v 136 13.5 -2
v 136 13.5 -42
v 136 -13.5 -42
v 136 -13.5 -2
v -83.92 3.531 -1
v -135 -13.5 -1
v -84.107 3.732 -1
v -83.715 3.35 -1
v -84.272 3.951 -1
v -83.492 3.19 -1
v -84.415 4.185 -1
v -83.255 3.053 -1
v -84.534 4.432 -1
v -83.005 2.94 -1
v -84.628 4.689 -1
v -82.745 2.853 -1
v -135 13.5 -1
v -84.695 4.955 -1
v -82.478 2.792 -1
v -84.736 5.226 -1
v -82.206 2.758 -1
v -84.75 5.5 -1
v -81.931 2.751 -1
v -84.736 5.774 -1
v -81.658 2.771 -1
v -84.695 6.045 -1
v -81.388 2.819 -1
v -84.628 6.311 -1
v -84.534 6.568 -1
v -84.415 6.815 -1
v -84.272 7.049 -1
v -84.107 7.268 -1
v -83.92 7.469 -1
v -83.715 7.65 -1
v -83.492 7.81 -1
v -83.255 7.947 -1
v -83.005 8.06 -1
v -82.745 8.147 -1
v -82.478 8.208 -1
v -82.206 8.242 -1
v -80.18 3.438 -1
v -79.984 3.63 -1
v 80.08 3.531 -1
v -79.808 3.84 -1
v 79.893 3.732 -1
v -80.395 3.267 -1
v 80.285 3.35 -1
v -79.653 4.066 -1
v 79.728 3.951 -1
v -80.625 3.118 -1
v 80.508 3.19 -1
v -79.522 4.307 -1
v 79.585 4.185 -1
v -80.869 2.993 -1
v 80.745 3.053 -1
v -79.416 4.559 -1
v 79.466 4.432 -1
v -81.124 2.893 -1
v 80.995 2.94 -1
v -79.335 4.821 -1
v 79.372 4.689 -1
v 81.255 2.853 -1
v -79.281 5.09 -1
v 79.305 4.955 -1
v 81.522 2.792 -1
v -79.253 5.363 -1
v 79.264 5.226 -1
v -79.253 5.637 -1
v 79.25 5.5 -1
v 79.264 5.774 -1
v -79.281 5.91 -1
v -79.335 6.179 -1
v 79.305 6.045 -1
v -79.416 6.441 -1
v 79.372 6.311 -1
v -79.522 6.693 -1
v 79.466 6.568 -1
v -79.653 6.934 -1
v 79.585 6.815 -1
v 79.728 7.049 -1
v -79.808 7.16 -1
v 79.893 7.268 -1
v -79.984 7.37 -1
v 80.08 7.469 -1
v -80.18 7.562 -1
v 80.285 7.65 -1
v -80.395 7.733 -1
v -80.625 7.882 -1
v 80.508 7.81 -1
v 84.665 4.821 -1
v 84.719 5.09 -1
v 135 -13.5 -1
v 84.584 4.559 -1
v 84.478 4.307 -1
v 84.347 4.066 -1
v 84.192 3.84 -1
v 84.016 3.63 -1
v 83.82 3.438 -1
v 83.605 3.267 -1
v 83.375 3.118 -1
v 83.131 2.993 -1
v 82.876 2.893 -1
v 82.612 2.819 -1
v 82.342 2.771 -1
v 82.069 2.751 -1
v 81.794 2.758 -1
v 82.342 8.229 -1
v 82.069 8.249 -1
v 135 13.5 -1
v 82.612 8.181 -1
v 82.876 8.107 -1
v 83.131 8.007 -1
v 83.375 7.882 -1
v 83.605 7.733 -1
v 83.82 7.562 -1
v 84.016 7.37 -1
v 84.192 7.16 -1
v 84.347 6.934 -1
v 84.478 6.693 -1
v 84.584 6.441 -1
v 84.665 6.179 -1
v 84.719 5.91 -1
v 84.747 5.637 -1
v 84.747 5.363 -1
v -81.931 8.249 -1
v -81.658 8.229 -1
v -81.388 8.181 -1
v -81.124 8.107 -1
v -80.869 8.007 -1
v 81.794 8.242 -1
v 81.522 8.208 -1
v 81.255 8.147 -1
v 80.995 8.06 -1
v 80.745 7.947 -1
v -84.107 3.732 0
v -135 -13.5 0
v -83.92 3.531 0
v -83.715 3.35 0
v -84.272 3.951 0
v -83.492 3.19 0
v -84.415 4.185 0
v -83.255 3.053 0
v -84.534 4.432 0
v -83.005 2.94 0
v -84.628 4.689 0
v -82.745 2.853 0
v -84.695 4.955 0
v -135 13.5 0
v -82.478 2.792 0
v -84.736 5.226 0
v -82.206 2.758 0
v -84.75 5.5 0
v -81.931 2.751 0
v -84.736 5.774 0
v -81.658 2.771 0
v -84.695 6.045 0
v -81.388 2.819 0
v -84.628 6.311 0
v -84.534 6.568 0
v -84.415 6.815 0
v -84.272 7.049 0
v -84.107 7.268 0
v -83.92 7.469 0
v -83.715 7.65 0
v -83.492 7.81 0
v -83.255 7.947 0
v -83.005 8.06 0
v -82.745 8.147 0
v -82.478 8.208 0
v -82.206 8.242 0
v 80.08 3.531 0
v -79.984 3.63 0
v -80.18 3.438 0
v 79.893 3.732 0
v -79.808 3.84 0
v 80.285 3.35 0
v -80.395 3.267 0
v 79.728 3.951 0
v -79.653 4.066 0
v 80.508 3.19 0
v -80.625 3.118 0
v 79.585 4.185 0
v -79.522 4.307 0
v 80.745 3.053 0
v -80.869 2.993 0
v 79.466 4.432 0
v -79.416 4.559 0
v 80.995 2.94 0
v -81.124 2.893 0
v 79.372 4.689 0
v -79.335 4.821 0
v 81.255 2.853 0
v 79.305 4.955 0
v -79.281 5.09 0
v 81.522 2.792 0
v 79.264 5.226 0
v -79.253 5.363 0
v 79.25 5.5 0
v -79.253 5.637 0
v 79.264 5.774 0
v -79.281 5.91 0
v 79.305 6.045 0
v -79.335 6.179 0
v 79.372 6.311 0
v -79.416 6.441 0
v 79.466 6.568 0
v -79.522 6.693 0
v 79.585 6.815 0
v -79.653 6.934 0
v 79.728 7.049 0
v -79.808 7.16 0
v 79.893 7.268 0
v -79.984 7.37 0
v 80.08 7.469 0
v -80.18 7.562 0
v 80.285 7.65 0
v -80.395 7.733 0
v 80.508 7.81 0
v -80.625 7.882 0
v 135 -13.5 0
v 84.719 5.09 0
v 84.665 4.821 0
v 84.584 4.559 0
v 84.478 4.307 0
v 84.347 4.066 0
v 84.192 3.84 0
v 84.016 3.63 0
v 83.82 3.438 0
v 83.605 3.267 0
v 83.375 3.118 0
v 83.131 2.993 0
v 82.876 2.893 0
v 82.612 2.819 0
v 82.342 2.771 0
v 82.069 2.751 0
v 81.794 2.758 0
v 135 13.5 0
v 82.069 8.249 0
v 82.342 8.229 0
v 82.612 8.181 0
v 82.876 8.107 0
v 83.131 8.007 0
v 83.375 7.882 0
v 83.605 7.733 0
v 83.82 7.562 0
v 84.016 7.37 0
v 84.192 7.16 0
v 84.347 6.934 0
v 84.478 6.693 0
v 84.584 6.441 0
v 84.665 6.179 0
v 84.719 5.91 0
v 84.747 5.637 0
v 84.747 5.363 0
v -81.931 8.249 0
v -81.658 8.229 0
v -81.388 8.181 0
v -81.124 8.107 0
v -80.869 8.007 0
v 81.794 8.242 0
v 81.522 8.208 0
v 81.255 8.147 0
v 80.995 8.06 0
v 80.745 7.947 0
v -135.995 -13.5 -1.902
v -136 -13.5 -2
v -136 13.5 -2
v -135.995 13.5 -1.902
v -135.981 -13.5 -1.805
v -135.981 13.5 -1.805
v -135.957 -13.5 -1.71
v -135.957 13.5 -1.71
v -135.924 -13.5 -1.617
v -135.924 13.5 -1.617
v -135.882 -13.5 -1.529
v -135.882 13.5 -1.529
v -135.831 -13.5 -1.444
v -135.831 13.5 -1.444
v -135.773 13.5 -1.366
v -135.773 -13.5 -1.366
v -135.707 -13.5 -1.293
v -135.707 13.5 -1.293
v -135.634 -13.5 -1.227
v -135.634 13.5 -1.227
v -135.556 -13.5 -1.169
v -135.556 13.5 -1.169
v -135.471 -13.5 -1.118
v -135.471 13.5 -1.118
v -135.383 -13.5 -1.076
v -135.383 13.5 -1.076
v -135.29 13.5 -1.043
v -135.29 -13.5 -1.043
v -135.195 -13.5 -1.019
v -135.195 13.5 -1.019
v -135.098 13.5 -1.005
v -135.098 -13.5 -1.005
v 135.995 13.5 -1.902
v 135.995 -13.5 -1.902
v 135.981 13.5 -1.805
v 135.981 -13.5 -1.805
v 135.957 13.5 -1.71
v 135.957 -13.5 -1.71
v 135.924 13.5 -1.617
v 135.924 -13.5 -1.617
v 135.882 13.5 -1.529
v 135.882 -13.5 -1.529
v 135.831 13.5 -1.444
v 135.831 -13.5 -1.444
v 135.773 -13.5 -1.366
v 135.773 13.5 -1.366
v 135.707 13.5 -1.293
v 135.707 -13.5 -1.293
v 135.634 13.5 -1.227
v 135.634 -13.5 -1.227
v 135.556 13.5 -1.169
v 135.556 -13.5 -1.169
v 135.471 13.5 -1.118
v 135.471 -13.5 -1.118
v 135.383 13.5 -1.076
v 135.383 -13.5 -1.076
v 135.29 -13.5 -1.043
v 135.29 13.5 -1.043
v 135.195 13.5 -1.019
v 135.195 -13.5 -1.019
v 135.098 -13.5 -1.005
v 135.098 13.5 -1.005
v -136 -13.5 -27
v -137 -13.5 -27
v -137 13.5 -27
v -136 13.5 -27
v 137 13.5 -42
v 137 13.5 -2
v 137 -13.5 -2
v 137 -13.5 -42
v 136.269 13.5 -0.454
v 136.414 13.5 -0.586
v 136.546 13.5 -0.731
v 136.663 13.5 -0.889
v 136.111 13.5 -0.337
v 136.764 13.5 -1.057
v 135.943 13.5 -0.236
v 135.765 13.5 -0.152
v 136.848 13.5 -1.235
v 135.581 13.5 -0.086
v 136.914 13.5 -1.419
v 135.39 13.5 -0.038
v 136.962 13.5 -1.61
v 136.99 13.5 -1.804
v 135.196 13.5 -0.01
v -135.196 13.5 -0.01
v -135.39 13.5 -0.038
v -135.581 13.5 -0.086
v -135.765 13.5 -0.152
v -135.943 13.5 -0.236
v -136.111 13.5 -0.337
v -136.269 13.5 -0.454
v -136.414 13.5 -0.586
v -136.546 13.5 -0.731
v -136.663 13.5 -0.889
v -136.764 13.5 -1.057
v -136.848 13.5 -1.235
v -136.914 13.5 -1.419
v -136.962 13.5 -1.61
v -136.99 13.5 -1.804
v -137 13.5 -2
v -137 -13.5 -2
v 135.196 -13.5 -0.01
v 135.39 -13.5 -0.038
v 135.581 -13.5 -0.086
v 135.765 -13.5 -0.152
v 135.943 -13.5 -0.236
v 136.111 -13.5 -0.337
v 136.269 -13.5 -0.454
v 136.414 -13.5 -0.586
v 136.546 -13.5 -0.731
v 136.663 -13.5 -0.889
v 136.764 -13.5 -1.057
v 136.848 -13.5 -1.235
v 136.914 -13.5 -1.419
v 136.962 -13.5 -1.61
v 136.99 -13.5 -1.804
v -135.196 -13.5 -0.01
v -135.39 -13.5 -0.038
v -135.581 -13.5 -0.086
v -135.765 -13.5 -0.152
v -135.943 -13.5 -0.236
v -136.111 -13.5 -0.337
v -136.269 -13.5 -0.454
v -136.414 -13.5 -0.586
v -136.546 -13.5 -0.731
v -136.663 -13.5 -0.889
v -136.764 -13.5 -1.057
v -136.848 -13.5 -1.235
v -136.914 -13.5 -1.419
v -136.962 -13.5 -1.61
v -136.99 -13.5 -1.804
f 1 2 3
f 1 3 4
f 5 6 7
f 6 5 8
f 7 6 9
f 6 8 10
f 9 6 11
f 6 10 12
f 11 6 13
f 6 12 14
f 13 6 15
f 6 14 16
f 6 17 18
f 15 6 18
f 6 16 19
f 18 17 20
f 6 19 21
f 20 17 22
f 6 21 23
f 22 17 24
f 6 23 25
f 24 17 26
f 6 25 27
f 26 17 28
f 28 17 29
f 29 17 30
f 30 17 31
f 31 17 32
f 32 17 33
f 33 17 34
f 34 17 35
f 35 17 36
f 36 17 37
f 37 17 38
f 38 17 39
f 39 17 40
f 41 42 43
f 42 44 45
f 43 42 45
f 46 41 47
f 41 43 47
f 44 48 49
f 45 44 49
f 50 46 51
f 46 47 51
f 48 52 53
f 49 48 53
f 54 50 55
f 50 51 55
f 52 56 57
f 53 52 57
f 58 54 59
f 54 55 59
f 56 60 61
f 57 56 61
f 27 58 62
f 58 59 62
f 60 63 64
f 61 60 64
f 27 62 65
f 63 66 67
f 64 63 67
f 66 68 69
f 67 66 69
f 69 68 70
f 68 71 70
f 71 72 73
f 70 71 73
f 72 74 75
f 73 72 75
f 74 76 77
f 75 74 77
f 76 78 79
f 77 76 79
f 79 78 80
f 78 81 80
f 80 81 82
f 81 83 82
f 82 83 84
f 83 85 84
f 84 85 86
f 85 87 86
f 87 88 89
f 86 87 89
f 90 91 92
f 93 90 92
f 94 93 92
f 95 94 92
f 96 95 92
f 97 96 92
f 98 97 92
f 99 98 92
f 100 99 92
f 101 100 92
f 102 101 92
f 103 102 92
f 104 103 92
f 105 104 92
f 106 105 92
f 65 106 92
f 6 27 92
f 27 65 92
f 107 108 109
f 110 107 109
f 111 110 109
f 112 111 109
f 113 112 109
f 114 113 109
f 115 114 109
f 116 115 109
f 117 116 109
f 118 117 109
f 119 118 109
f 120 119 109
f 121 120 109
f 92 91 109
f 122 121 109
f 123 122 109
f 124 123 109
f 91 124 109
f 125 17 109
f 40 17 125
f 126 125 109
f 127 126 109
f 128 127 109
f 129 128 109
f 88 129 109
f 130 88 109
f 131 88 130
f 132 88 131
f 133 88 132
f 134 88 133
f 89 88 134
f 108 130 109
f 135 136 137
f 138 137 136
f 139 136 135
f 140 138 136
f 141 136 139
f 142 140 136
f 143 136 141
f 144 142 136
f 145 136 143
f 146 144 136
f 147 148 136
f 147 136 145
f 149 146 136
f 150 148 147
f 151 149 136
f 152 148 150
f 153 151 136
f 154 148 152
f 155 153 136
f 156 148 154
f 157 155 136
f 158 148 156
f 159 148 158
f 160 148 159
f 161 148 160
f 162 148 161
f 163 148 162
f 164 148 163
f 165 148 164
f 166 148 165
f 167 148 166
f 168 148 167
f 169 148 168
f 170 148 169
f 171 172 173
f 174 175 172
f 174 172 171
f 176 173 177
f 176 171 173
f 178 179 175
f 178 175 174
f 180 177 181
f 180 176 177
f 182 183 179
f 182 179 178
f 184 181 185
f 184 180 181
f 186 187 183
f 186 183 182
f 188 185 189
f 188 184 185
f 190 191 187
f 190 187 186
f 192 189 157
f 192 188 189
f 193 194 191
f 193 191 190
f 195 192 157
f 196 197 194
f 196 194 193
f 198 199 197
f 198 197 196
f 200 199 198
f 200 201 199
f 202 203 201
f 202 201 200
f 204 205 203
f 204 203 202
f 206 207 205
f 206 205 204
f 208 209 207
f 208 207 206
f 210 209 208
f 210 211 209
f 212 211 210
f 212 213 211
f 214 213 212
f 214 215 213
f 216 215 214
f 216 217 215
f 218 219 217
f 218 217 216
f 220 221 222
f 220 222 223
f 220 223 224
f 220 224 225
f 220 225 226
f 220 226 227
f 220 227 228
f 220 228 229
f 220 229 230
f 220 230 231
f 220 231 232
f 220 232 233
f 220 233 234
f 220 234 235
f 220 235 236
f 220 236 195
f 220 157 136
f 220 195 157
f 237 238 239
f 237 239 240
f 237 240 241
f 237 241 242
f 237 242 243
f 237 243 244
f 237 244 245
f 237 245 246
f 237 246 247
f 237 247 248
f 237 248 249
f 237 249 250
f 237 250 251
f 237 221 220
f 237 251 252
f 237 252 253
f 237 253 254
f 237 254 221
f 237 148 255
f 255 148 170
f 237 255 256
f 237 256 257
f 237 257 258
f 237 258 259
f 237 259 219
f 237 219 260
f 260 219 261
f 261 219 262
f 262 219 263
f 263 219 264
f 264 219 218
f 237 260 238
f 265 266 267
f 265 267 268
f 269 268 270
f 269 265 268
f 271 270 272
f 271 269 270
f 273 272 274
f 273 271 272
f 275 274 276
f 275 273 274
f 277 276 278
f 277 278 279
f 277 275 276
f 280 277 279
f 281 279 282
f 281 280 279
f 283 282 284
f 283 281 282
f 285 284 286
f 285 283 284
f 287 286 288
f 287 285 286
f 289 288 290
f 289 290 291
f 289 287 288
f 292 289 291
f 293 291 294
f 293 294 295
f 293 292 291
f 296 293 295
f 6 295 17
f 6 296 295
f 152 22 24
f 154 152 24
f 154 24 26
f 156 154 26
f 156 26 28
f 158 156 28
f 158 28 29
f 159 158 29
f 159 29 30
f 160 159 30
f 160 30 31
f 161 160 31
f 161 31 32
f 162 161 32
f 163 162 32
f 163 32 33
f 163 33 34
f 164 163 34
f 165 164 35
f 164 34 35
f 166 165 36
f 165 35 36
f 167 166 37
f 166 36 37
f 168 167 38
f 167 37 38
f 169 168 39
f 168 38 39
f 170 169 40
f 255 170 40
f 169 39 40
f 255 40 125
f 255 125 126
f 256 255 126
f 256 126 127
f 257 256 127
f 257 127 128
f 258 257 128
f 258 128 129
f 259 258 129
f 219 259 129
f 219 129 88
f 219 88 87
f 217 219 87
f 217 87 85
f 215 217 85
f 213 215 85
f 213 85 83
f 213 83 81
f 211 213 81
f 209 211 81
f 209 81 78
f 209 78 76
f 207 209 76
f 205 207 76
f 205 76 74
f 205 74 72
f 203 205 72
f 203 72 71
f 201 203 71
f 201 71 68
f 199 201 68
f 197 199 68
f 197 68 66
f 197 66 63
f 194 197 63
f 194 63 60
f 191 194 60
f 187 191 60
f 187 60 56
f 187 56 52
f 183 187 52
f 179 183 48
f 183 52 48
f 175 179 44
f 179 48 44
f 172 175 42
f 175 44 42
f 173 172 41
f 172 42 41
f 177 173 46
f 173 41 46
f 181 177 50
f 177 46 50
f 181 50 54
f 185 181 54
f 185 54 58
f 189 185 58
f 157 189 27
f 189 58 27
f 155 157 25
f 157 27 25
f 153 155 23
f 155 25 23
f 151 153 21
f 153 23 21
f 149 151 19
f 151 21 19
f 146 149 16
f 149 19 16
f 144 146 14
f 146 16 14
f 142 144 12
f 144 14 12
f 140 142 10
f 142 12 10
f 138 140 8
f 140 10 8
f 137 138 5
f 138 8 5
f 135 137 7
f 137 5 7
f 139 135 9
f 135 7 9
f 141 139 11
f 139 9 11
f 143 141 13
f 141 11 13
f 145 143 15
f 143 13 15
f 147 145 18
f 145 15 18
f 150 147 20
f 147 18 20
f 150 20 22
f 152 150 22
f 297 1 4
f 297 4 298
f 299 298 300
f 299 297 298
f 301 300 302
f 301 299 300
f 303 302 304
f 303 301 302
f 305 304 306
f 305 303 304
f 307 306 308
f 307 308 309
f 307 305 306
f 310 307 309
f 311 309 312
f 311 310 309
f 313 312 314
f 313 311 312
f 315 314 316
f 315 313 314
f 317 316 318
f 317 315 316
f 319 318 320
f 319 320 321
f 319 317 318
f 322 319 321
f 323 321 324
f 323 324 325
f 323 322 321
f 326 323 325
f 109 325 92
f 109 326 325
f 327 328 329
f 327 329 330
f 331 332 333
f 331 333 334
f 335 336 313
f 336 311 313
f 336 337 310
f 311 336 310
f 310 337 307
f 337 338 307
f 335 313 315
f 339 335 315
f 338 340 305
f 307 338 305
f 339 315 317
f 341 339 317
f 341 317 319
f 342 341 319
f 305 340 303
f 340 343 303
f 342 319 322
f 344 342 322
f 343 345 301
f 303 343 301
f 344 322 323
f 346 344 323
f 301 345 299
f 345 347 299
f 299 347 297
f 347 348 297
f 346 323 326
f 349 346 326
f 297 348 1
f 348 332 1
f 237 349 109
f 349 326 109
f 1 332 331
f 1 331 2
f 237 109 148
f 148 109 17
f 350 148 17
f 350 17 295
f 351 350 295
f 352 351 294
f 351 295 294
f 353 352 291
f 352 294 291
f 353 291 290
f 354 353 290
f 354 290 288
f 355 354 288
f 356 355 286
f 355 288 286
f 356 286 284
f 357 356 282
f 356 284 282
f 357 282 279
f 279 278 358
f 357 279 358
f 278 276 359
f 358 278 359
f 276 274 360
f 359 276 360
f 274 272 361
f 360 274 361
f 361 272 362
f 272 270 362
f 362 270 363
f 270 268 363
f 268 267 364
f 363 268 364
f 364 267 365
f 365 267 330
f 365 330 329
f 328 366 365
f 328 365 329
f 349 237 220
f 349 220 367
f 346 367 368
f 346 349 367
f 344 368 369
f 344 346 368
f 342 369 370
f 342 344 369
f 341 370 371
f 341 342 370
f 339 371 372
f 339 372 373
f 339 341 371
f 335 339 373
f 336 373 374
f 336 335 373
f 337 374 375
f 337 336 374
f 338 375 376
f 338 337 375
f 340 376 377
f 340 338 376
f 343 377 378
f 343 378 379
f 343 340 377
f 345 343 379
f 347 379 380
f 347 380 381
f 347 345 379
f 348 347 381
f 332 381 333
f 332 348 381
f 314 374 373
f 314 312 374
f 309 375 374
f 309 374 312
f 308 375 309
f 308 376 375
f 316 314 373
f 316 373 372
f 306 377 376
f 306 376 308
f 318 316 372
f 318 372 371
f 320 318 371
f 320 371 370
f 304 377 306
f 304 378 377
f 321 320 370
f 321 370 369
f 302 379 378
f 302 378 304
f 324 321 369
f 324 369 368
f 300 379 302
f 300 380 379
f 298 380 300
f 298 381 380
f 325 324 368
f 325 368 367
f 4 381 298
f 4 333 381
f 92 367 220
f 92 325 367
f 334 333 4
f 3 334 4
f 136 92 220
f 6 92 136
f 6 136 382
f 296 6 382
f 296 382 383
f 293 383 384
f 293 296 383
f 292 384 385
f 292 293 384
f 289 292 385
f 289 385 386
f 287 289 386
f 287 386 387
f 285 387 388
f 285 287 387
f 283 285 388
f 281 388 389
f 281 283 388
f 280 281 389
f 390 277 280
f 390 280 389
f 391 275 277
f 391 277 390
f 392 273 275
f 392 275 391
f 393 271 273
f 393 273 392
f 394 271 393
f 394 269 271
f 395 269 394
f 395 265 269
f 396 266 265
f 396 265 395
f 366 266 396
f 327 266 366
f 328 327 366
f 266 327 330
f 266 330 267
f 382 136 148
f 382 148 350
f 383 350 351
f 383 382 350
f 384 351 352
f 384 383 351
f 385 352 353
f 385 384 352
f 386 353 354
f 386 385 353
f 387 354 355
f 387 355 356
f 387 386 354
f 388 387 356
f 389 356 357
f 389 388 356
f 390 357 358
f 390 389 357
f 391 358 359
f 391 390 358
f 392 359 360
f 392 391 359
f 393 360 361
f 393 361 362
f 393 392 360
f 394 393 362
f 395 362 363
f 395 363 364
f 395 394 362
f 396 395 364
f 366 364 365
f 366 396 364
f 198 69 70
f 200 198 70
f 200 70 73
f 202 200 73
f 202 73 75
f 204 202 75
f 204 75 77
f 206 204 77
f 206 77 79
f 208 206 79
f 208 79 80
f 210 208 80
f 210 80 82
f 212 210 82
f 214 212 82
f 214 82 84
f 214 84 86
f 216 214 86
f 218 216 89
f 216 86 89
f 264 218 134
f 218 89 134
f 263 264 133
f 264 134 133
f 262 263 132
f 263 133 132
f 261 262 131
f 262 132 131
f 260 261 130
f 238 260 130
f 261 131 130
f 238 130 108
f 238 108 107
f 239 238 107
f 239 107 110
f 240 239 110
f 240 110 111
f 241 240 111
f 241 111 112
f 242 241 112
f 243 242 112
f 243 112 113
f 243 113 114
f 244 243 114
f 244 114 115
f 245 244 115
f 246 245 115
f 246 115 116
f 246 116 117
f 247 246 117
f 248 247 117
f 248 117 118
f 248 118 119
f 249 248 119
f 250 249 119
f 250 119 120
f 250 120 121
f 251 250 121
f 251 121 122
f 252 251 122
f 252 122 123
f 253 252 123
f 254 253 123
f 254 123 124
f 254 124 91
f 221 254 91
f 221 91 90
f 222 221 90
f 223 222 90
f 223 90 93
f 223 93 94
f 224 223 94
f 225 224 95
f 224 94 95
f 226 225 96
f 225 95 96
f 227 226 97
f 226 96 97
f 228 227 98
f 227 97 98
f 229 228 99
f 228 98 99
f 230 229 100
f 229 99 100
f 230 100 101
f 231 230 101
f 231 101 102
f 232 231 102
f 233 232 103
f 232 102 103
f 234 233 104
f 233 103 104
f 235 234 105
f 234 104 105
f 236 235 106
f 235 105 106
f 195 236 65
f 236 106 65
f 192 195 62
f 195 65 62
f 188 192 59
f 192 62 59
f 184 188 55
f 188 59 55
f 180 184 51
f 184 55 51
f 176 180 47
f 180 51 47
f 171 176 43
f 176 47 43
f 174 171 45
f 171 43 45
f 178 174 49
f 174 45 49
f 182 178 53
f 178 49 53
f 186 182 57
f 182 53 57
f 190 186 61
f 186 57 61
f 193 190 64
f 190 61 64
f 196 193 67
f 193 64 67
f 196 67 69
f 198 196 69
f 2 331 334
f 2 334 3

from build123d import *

# Parameters (mm, degrees)
SKETCH1_W            = 270
SKETCH1_H            = 27
BASE_FLANGE1_DEPTH   = 1
EDGE_FLANGE1_DEPTH   = 27
EDGE_FLANGE2_DEPTH   = 27
M5_CLEARANCE_HOLE1_D = 5.5


# Sheet-metal steps are written as plain solids
with BuildPart() as part:
    # Sketch1 → Base-Flange1 (new body)
    with BuildSketch(Plane.XY):
        Rectangle(SKETCH1_W, SKETCH1_H)
    extrude(amount=-BASE_FLANGE1_DEPTH)

    # Edge-Flange1 section (across the edge) → Edge-Flange1 (add)
    with BuildSketch(Plane(origin=(136, 13.5, -1), x_dir=(-1, 0, 0), z_dir=(0, -1, 0))):
        with BuildLine():
            Line((-1, 1), (-1, 41))
            Line((-1, 41), (0, 41))
            Line((0, 41), (0, 1))
            ThreePointArc((0, 1), (0.292893219, 0.292893219), (1, 0))
            Line((1, 0), (1, -1))
            ThreePointArc((1, -1), (-0.414213562, -0.414213562), (-1, 1))
        make_face()
    extrude(amount=EDGE_FLANGE1_DEPTH)

    # Edge-Flange2 section (across the edge) → Edge-Flange2 (add)
    with BuildSketch(Plane(origin=(-136, -13.5, -1), x_dir=(1, 0, 0), z_dir=(0, 1, 0))):
        with BuildLine():
            Line((-1, 1), (-1, 26))
            Line((-1, 26), (0, 26))
            Line((0, 26), (0, 1))
            ThreePointArc((0, 1), (0.292893219, 0.292893219), (1, 0))
            Line((1, 0), (1, -1))
            ThreePointArc((1, -1), (-0.414213562, -0.414213562), (-1, 1))
        make_face()
    extrude(amount=EDGE_FLANGE2_DEPTH)

    # M5 Clearance Hole1 (through all)
    with Locations(Plane.XY):
        with Locations((82, 5.5), (-82, 5.5)):
            Hole(M5_CLEARANCE_HOLE1_D / 2)


solid = part.part
